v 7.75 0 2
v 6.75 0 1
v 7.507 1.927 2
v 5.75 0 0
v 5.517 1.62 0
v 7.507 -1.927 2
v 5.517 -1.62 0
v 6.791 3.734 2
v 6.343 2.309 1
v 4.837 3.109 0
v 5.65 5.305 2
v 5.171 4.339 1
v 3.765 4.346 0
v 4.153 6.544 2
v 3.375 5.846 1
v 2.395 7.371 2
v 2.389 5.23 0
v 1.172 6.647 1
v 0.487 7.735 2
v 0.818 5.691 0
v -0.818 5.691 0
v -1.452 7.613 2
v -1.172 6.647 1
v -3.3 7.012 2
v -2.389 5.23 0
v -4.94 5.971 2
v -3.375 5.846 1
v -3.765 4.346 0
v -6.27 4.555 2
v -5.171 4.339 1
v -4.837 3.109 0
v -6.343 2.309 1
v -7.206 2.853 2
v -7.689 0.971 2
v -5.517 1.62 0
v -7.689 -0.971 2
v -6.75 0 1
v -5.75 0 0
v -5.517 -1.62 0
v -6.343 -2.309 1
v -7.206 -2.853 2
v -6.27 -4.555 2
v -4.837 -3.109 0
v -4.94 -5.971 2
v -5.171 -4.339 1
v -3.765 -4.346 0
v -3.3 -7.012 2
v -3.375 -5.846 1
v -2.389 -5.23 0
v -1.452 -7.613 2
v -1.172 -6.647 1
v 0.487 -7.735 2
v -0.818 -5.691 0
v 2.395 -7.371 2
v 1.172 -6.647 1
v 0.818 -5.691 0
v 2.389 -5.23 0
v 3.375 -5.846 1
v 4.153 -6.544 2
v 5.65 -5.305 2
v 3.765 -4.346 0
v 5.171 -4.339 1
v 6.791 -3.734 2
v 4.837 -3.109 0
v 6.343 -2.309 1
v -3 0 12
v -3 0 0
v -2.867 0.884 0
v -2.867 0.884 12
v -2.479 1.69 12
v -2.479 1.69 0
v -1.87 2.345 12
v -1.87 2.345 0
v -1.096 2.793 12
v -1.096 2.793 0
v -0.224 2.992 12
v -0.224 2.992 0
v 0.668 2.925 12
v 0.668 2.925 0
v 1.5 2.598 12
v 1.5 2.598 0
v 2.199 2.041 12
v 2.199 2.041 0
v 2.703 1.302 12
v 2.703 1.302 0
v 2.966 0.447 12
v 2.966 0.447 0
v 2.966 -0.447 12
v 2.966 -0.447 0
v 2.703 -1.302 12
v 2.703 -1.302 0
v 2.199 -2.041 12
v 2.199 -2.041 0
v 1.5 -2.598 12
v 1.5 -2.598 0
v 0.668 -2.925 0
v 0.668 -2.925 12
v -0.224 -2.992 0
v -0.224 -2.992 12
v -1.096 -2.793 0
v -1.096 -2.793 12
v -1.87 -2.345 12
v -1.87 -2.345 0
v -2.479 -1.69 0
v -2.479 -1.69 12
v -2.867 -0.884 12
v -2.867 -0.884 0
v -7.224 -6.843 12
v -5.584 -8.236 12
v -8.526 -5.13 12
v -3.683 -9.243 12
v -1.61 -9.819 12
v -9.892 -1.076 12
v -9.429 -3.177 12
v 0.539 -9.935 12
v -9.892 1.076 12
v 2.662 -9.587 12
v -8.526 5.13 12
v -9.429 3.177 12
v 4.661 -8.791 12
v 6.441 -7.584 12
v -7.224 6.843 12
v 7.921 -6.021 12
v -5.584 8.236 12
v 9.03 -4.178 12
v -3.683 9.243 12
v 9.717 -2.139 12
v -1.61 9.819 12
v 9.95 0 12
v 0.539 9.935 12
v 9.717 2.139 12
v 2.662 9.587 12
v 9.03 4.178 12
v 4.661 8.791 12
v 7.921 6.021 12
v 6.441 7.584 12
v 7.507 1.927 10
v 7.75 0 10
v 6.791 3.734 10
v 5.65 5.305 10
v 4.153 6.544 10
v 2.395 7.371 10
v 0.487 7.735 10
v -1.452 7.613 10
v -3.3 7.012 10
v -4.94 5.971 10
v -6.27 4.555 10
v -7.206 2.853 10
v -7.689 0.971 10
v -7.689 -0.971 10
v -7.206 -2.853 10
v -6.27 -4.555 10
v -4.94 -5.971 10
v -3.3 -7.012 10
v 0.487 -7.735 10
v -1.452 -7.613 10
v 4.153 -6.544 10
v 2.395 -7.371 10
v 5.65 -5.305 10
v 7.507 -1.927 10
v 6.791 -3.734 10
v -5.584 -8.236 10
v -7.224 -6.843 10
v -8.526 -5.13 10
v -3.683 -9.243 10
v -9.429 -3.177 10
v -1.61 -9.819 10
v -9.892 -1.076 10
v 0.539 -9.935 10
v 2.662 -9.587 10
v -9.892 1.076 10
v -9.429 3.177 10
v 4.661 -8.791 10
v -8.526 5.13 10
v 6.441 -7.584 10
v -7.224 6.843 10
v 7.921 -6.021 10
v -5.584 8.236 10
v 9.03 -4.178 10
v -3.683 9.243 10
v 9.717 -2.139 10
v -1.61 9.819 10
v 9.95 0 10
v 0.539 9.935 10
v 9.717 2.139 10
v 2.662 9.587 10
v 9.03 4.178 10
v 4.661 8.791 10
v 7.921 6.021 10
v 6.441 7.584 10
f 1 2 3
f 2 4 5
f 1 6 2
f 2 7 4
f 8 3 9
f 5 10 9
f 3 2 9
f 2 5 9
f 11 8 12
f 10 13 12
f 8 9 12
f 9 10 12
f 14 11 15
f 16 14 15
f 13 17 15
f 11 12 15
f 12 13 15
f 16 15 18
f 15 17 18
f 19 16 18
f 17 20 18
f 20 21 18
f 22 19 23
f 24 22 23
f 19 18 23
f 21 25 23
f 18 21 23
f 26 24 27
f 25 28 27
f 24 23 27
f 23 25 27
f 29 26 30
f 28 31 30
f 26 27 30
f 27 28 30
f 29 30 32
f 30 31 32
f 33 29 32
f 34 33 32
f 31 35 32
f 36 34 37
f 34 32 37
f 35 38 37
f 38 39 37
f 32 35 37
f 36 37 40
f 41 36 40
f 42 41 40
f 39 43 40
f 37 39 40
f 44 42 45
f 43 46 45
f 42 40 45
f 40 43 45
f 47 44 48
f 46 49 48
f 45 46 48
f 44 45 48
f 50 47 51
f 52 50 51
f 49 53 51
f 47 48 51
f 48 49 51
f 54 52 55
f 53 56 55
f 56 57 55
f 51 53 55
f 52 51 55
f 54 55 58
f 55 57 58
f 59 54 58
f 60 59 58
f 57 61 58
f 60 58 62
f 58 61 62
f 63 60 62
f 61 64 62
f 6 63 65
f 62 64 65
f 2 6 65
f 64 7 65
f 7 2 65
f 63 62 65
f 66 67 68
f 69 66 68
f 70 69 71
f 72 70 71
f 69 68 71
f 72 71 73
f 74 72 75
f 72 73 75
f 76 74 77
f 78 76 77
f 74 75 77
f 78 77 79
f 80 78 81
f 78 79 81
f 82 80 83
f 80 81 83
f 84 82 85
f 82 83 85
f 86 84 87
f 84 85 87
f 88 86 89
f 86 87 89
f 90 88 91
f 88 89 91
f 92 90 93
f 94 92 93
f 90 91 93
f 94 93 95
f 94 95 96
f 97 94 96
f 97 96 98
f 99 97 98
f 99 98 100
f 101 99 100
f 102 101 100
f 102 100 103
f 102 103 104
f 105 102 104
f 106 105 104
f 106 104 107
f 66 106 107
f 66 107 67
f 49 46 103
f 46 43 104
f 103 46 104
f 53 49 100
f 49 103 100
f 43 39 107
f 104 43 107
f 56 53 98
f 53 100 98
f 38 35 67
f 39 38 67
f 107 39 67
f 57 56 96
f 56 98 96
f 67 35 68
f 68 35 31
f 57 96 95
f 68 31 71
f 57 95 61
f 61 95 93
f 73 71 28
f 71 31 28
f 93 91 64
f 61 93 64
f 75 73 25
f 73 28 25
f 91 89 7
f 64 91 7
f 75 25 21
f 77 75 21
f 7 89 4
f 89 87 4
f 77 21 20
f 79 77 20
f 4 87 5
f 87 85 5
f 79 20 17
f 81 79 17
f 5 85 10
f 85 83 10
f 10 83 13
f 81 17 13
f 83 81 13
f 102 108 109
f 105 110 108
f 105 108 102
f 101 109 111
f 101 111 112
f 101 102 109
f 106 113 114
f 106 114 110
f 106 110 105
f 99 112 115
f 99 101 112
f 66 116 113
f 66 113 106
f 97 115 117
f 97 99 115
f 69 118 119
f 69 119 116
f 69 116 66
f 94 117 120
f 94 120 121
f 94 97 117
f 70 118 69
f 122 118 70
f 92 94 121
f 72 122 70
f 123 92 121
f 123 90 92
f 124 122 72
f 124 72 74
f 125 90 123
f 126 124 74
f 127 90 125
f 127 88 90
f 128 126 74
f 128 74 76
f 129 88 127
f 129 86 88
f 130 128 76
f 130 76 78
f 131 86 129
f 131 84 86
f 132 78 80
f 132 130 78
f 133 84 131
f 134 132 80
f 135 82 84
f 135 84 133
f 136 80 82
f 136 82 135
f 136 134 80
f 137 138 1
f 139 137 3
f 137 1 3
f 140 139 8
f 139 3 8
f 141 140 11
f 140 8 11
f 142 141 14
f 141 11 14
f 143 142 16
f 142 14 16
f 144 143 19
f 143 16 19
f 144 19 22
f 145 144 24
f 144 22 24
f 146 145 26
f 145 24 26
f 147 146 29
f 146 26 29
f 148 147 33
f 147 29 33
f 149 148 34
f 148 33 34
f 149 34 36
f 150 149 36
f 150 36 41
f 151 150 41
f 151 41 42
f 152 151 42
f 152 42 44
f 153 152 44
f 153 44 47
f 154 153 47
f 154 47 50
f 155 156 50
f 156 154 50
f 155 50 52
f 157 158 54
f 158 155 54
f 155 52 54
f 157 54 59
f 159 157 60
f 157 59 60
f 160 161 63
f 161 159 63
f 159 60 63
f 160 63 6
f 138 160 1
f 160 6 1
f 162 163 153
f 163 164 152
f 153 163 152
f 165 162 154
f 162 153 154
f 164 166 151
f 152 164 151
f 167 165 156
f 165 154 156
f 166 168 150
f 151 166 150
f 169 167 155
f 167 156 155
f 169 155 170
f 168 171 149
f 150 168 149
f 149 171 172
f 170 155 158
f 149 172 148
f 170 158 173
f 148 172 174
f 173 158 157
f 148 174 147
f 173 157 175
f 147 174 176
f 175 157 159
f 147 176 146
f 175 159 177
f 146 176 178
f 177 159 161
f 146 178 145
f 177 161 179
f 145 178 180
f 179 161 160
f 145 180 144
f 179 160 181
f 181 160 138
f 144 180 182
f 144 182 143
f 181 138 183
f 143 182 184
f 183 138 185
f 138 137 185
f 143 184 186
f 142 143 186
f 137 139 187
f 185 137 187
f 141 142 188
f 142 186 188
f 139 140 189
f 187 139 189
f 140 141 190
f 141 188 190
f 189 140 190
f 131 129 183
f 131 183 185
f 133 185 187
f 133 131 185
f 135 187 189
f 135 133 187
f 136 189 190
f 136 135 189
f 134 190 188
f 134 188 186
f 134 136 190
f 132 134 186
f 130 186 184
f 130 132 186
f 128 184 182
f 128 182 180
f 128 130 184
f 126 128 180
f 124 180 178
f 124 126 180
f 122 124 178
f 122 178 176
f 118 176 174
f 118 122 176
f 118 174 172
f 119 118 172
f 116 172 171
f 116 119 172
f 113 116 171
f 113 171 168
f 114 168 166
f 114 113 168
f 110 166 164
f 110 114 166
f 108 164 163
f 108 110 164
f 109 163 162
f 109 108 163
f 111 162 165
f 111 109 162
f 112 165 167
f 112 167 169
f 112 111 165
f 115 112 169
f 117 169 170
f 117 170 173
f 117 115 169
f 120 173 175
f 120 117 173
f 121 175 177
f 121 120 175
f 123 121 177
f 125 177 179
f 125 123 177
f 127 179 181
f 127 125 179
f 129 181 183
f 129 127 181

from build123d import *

# Parameters (mm, degrees)
SKETCH1_R           = 7.75
SKETCH1_R_2         = 2.5
BOSS_EXTRUDE1_DEPTH = 12
SKETCH2_R           = 9.95
SKETCH2_R_2         = 3
BOSS_EXTRUDE2_DEPTH = 2
CHAMFER1_SIZE       = 2
SKETCH3_R           = 3
CUT_EXTRUDE1_DEPTH  = 13


with BuildPart() as part:
    # Sketch1 → Boss-Extrude1 (new body)
    with BuildSketch(Plane.XY):
        Circle(SKETCH1_R)
        Circle(SKETCH1_R_2, mode=Mode.SUBTRACT)
    extrude(amount=BOSS_EXTRUDE1_DEPTH)

    # Sketch2 → Boss-Extrude2 (add)
    with BuildSketch(Plane.XY.offset(12)):
        Circle(SKETCH2_R)
        Circle(SKETCH2_R_2, mode=Mode.SUBTRACT)
    extrude(amount=-BOSS_EXTRUDE2_DEPTH)

    # Chamfer1
    chamfer1_edges = [part.edges().sort_by_distance(p)[0] for p in [
        (-7.75, 0, 0),
    ]]
    chamfer(chamfer1_edges, length=CHAMFER1_SIZE)

    # Sketch3 → Cut-Extrude1 (cut, through all)
    with BuildSketch(Plane(origin=(0, 0, 0), x_dir=(-1, 0, 0), z_dir=(0, 0, -1))):
        Circle(SKETCH3_R)
    extrude(amount=-CUT_EXTRUDE1_DEPTH, mode=Mode.SUBTRACT)


solid = part.part
